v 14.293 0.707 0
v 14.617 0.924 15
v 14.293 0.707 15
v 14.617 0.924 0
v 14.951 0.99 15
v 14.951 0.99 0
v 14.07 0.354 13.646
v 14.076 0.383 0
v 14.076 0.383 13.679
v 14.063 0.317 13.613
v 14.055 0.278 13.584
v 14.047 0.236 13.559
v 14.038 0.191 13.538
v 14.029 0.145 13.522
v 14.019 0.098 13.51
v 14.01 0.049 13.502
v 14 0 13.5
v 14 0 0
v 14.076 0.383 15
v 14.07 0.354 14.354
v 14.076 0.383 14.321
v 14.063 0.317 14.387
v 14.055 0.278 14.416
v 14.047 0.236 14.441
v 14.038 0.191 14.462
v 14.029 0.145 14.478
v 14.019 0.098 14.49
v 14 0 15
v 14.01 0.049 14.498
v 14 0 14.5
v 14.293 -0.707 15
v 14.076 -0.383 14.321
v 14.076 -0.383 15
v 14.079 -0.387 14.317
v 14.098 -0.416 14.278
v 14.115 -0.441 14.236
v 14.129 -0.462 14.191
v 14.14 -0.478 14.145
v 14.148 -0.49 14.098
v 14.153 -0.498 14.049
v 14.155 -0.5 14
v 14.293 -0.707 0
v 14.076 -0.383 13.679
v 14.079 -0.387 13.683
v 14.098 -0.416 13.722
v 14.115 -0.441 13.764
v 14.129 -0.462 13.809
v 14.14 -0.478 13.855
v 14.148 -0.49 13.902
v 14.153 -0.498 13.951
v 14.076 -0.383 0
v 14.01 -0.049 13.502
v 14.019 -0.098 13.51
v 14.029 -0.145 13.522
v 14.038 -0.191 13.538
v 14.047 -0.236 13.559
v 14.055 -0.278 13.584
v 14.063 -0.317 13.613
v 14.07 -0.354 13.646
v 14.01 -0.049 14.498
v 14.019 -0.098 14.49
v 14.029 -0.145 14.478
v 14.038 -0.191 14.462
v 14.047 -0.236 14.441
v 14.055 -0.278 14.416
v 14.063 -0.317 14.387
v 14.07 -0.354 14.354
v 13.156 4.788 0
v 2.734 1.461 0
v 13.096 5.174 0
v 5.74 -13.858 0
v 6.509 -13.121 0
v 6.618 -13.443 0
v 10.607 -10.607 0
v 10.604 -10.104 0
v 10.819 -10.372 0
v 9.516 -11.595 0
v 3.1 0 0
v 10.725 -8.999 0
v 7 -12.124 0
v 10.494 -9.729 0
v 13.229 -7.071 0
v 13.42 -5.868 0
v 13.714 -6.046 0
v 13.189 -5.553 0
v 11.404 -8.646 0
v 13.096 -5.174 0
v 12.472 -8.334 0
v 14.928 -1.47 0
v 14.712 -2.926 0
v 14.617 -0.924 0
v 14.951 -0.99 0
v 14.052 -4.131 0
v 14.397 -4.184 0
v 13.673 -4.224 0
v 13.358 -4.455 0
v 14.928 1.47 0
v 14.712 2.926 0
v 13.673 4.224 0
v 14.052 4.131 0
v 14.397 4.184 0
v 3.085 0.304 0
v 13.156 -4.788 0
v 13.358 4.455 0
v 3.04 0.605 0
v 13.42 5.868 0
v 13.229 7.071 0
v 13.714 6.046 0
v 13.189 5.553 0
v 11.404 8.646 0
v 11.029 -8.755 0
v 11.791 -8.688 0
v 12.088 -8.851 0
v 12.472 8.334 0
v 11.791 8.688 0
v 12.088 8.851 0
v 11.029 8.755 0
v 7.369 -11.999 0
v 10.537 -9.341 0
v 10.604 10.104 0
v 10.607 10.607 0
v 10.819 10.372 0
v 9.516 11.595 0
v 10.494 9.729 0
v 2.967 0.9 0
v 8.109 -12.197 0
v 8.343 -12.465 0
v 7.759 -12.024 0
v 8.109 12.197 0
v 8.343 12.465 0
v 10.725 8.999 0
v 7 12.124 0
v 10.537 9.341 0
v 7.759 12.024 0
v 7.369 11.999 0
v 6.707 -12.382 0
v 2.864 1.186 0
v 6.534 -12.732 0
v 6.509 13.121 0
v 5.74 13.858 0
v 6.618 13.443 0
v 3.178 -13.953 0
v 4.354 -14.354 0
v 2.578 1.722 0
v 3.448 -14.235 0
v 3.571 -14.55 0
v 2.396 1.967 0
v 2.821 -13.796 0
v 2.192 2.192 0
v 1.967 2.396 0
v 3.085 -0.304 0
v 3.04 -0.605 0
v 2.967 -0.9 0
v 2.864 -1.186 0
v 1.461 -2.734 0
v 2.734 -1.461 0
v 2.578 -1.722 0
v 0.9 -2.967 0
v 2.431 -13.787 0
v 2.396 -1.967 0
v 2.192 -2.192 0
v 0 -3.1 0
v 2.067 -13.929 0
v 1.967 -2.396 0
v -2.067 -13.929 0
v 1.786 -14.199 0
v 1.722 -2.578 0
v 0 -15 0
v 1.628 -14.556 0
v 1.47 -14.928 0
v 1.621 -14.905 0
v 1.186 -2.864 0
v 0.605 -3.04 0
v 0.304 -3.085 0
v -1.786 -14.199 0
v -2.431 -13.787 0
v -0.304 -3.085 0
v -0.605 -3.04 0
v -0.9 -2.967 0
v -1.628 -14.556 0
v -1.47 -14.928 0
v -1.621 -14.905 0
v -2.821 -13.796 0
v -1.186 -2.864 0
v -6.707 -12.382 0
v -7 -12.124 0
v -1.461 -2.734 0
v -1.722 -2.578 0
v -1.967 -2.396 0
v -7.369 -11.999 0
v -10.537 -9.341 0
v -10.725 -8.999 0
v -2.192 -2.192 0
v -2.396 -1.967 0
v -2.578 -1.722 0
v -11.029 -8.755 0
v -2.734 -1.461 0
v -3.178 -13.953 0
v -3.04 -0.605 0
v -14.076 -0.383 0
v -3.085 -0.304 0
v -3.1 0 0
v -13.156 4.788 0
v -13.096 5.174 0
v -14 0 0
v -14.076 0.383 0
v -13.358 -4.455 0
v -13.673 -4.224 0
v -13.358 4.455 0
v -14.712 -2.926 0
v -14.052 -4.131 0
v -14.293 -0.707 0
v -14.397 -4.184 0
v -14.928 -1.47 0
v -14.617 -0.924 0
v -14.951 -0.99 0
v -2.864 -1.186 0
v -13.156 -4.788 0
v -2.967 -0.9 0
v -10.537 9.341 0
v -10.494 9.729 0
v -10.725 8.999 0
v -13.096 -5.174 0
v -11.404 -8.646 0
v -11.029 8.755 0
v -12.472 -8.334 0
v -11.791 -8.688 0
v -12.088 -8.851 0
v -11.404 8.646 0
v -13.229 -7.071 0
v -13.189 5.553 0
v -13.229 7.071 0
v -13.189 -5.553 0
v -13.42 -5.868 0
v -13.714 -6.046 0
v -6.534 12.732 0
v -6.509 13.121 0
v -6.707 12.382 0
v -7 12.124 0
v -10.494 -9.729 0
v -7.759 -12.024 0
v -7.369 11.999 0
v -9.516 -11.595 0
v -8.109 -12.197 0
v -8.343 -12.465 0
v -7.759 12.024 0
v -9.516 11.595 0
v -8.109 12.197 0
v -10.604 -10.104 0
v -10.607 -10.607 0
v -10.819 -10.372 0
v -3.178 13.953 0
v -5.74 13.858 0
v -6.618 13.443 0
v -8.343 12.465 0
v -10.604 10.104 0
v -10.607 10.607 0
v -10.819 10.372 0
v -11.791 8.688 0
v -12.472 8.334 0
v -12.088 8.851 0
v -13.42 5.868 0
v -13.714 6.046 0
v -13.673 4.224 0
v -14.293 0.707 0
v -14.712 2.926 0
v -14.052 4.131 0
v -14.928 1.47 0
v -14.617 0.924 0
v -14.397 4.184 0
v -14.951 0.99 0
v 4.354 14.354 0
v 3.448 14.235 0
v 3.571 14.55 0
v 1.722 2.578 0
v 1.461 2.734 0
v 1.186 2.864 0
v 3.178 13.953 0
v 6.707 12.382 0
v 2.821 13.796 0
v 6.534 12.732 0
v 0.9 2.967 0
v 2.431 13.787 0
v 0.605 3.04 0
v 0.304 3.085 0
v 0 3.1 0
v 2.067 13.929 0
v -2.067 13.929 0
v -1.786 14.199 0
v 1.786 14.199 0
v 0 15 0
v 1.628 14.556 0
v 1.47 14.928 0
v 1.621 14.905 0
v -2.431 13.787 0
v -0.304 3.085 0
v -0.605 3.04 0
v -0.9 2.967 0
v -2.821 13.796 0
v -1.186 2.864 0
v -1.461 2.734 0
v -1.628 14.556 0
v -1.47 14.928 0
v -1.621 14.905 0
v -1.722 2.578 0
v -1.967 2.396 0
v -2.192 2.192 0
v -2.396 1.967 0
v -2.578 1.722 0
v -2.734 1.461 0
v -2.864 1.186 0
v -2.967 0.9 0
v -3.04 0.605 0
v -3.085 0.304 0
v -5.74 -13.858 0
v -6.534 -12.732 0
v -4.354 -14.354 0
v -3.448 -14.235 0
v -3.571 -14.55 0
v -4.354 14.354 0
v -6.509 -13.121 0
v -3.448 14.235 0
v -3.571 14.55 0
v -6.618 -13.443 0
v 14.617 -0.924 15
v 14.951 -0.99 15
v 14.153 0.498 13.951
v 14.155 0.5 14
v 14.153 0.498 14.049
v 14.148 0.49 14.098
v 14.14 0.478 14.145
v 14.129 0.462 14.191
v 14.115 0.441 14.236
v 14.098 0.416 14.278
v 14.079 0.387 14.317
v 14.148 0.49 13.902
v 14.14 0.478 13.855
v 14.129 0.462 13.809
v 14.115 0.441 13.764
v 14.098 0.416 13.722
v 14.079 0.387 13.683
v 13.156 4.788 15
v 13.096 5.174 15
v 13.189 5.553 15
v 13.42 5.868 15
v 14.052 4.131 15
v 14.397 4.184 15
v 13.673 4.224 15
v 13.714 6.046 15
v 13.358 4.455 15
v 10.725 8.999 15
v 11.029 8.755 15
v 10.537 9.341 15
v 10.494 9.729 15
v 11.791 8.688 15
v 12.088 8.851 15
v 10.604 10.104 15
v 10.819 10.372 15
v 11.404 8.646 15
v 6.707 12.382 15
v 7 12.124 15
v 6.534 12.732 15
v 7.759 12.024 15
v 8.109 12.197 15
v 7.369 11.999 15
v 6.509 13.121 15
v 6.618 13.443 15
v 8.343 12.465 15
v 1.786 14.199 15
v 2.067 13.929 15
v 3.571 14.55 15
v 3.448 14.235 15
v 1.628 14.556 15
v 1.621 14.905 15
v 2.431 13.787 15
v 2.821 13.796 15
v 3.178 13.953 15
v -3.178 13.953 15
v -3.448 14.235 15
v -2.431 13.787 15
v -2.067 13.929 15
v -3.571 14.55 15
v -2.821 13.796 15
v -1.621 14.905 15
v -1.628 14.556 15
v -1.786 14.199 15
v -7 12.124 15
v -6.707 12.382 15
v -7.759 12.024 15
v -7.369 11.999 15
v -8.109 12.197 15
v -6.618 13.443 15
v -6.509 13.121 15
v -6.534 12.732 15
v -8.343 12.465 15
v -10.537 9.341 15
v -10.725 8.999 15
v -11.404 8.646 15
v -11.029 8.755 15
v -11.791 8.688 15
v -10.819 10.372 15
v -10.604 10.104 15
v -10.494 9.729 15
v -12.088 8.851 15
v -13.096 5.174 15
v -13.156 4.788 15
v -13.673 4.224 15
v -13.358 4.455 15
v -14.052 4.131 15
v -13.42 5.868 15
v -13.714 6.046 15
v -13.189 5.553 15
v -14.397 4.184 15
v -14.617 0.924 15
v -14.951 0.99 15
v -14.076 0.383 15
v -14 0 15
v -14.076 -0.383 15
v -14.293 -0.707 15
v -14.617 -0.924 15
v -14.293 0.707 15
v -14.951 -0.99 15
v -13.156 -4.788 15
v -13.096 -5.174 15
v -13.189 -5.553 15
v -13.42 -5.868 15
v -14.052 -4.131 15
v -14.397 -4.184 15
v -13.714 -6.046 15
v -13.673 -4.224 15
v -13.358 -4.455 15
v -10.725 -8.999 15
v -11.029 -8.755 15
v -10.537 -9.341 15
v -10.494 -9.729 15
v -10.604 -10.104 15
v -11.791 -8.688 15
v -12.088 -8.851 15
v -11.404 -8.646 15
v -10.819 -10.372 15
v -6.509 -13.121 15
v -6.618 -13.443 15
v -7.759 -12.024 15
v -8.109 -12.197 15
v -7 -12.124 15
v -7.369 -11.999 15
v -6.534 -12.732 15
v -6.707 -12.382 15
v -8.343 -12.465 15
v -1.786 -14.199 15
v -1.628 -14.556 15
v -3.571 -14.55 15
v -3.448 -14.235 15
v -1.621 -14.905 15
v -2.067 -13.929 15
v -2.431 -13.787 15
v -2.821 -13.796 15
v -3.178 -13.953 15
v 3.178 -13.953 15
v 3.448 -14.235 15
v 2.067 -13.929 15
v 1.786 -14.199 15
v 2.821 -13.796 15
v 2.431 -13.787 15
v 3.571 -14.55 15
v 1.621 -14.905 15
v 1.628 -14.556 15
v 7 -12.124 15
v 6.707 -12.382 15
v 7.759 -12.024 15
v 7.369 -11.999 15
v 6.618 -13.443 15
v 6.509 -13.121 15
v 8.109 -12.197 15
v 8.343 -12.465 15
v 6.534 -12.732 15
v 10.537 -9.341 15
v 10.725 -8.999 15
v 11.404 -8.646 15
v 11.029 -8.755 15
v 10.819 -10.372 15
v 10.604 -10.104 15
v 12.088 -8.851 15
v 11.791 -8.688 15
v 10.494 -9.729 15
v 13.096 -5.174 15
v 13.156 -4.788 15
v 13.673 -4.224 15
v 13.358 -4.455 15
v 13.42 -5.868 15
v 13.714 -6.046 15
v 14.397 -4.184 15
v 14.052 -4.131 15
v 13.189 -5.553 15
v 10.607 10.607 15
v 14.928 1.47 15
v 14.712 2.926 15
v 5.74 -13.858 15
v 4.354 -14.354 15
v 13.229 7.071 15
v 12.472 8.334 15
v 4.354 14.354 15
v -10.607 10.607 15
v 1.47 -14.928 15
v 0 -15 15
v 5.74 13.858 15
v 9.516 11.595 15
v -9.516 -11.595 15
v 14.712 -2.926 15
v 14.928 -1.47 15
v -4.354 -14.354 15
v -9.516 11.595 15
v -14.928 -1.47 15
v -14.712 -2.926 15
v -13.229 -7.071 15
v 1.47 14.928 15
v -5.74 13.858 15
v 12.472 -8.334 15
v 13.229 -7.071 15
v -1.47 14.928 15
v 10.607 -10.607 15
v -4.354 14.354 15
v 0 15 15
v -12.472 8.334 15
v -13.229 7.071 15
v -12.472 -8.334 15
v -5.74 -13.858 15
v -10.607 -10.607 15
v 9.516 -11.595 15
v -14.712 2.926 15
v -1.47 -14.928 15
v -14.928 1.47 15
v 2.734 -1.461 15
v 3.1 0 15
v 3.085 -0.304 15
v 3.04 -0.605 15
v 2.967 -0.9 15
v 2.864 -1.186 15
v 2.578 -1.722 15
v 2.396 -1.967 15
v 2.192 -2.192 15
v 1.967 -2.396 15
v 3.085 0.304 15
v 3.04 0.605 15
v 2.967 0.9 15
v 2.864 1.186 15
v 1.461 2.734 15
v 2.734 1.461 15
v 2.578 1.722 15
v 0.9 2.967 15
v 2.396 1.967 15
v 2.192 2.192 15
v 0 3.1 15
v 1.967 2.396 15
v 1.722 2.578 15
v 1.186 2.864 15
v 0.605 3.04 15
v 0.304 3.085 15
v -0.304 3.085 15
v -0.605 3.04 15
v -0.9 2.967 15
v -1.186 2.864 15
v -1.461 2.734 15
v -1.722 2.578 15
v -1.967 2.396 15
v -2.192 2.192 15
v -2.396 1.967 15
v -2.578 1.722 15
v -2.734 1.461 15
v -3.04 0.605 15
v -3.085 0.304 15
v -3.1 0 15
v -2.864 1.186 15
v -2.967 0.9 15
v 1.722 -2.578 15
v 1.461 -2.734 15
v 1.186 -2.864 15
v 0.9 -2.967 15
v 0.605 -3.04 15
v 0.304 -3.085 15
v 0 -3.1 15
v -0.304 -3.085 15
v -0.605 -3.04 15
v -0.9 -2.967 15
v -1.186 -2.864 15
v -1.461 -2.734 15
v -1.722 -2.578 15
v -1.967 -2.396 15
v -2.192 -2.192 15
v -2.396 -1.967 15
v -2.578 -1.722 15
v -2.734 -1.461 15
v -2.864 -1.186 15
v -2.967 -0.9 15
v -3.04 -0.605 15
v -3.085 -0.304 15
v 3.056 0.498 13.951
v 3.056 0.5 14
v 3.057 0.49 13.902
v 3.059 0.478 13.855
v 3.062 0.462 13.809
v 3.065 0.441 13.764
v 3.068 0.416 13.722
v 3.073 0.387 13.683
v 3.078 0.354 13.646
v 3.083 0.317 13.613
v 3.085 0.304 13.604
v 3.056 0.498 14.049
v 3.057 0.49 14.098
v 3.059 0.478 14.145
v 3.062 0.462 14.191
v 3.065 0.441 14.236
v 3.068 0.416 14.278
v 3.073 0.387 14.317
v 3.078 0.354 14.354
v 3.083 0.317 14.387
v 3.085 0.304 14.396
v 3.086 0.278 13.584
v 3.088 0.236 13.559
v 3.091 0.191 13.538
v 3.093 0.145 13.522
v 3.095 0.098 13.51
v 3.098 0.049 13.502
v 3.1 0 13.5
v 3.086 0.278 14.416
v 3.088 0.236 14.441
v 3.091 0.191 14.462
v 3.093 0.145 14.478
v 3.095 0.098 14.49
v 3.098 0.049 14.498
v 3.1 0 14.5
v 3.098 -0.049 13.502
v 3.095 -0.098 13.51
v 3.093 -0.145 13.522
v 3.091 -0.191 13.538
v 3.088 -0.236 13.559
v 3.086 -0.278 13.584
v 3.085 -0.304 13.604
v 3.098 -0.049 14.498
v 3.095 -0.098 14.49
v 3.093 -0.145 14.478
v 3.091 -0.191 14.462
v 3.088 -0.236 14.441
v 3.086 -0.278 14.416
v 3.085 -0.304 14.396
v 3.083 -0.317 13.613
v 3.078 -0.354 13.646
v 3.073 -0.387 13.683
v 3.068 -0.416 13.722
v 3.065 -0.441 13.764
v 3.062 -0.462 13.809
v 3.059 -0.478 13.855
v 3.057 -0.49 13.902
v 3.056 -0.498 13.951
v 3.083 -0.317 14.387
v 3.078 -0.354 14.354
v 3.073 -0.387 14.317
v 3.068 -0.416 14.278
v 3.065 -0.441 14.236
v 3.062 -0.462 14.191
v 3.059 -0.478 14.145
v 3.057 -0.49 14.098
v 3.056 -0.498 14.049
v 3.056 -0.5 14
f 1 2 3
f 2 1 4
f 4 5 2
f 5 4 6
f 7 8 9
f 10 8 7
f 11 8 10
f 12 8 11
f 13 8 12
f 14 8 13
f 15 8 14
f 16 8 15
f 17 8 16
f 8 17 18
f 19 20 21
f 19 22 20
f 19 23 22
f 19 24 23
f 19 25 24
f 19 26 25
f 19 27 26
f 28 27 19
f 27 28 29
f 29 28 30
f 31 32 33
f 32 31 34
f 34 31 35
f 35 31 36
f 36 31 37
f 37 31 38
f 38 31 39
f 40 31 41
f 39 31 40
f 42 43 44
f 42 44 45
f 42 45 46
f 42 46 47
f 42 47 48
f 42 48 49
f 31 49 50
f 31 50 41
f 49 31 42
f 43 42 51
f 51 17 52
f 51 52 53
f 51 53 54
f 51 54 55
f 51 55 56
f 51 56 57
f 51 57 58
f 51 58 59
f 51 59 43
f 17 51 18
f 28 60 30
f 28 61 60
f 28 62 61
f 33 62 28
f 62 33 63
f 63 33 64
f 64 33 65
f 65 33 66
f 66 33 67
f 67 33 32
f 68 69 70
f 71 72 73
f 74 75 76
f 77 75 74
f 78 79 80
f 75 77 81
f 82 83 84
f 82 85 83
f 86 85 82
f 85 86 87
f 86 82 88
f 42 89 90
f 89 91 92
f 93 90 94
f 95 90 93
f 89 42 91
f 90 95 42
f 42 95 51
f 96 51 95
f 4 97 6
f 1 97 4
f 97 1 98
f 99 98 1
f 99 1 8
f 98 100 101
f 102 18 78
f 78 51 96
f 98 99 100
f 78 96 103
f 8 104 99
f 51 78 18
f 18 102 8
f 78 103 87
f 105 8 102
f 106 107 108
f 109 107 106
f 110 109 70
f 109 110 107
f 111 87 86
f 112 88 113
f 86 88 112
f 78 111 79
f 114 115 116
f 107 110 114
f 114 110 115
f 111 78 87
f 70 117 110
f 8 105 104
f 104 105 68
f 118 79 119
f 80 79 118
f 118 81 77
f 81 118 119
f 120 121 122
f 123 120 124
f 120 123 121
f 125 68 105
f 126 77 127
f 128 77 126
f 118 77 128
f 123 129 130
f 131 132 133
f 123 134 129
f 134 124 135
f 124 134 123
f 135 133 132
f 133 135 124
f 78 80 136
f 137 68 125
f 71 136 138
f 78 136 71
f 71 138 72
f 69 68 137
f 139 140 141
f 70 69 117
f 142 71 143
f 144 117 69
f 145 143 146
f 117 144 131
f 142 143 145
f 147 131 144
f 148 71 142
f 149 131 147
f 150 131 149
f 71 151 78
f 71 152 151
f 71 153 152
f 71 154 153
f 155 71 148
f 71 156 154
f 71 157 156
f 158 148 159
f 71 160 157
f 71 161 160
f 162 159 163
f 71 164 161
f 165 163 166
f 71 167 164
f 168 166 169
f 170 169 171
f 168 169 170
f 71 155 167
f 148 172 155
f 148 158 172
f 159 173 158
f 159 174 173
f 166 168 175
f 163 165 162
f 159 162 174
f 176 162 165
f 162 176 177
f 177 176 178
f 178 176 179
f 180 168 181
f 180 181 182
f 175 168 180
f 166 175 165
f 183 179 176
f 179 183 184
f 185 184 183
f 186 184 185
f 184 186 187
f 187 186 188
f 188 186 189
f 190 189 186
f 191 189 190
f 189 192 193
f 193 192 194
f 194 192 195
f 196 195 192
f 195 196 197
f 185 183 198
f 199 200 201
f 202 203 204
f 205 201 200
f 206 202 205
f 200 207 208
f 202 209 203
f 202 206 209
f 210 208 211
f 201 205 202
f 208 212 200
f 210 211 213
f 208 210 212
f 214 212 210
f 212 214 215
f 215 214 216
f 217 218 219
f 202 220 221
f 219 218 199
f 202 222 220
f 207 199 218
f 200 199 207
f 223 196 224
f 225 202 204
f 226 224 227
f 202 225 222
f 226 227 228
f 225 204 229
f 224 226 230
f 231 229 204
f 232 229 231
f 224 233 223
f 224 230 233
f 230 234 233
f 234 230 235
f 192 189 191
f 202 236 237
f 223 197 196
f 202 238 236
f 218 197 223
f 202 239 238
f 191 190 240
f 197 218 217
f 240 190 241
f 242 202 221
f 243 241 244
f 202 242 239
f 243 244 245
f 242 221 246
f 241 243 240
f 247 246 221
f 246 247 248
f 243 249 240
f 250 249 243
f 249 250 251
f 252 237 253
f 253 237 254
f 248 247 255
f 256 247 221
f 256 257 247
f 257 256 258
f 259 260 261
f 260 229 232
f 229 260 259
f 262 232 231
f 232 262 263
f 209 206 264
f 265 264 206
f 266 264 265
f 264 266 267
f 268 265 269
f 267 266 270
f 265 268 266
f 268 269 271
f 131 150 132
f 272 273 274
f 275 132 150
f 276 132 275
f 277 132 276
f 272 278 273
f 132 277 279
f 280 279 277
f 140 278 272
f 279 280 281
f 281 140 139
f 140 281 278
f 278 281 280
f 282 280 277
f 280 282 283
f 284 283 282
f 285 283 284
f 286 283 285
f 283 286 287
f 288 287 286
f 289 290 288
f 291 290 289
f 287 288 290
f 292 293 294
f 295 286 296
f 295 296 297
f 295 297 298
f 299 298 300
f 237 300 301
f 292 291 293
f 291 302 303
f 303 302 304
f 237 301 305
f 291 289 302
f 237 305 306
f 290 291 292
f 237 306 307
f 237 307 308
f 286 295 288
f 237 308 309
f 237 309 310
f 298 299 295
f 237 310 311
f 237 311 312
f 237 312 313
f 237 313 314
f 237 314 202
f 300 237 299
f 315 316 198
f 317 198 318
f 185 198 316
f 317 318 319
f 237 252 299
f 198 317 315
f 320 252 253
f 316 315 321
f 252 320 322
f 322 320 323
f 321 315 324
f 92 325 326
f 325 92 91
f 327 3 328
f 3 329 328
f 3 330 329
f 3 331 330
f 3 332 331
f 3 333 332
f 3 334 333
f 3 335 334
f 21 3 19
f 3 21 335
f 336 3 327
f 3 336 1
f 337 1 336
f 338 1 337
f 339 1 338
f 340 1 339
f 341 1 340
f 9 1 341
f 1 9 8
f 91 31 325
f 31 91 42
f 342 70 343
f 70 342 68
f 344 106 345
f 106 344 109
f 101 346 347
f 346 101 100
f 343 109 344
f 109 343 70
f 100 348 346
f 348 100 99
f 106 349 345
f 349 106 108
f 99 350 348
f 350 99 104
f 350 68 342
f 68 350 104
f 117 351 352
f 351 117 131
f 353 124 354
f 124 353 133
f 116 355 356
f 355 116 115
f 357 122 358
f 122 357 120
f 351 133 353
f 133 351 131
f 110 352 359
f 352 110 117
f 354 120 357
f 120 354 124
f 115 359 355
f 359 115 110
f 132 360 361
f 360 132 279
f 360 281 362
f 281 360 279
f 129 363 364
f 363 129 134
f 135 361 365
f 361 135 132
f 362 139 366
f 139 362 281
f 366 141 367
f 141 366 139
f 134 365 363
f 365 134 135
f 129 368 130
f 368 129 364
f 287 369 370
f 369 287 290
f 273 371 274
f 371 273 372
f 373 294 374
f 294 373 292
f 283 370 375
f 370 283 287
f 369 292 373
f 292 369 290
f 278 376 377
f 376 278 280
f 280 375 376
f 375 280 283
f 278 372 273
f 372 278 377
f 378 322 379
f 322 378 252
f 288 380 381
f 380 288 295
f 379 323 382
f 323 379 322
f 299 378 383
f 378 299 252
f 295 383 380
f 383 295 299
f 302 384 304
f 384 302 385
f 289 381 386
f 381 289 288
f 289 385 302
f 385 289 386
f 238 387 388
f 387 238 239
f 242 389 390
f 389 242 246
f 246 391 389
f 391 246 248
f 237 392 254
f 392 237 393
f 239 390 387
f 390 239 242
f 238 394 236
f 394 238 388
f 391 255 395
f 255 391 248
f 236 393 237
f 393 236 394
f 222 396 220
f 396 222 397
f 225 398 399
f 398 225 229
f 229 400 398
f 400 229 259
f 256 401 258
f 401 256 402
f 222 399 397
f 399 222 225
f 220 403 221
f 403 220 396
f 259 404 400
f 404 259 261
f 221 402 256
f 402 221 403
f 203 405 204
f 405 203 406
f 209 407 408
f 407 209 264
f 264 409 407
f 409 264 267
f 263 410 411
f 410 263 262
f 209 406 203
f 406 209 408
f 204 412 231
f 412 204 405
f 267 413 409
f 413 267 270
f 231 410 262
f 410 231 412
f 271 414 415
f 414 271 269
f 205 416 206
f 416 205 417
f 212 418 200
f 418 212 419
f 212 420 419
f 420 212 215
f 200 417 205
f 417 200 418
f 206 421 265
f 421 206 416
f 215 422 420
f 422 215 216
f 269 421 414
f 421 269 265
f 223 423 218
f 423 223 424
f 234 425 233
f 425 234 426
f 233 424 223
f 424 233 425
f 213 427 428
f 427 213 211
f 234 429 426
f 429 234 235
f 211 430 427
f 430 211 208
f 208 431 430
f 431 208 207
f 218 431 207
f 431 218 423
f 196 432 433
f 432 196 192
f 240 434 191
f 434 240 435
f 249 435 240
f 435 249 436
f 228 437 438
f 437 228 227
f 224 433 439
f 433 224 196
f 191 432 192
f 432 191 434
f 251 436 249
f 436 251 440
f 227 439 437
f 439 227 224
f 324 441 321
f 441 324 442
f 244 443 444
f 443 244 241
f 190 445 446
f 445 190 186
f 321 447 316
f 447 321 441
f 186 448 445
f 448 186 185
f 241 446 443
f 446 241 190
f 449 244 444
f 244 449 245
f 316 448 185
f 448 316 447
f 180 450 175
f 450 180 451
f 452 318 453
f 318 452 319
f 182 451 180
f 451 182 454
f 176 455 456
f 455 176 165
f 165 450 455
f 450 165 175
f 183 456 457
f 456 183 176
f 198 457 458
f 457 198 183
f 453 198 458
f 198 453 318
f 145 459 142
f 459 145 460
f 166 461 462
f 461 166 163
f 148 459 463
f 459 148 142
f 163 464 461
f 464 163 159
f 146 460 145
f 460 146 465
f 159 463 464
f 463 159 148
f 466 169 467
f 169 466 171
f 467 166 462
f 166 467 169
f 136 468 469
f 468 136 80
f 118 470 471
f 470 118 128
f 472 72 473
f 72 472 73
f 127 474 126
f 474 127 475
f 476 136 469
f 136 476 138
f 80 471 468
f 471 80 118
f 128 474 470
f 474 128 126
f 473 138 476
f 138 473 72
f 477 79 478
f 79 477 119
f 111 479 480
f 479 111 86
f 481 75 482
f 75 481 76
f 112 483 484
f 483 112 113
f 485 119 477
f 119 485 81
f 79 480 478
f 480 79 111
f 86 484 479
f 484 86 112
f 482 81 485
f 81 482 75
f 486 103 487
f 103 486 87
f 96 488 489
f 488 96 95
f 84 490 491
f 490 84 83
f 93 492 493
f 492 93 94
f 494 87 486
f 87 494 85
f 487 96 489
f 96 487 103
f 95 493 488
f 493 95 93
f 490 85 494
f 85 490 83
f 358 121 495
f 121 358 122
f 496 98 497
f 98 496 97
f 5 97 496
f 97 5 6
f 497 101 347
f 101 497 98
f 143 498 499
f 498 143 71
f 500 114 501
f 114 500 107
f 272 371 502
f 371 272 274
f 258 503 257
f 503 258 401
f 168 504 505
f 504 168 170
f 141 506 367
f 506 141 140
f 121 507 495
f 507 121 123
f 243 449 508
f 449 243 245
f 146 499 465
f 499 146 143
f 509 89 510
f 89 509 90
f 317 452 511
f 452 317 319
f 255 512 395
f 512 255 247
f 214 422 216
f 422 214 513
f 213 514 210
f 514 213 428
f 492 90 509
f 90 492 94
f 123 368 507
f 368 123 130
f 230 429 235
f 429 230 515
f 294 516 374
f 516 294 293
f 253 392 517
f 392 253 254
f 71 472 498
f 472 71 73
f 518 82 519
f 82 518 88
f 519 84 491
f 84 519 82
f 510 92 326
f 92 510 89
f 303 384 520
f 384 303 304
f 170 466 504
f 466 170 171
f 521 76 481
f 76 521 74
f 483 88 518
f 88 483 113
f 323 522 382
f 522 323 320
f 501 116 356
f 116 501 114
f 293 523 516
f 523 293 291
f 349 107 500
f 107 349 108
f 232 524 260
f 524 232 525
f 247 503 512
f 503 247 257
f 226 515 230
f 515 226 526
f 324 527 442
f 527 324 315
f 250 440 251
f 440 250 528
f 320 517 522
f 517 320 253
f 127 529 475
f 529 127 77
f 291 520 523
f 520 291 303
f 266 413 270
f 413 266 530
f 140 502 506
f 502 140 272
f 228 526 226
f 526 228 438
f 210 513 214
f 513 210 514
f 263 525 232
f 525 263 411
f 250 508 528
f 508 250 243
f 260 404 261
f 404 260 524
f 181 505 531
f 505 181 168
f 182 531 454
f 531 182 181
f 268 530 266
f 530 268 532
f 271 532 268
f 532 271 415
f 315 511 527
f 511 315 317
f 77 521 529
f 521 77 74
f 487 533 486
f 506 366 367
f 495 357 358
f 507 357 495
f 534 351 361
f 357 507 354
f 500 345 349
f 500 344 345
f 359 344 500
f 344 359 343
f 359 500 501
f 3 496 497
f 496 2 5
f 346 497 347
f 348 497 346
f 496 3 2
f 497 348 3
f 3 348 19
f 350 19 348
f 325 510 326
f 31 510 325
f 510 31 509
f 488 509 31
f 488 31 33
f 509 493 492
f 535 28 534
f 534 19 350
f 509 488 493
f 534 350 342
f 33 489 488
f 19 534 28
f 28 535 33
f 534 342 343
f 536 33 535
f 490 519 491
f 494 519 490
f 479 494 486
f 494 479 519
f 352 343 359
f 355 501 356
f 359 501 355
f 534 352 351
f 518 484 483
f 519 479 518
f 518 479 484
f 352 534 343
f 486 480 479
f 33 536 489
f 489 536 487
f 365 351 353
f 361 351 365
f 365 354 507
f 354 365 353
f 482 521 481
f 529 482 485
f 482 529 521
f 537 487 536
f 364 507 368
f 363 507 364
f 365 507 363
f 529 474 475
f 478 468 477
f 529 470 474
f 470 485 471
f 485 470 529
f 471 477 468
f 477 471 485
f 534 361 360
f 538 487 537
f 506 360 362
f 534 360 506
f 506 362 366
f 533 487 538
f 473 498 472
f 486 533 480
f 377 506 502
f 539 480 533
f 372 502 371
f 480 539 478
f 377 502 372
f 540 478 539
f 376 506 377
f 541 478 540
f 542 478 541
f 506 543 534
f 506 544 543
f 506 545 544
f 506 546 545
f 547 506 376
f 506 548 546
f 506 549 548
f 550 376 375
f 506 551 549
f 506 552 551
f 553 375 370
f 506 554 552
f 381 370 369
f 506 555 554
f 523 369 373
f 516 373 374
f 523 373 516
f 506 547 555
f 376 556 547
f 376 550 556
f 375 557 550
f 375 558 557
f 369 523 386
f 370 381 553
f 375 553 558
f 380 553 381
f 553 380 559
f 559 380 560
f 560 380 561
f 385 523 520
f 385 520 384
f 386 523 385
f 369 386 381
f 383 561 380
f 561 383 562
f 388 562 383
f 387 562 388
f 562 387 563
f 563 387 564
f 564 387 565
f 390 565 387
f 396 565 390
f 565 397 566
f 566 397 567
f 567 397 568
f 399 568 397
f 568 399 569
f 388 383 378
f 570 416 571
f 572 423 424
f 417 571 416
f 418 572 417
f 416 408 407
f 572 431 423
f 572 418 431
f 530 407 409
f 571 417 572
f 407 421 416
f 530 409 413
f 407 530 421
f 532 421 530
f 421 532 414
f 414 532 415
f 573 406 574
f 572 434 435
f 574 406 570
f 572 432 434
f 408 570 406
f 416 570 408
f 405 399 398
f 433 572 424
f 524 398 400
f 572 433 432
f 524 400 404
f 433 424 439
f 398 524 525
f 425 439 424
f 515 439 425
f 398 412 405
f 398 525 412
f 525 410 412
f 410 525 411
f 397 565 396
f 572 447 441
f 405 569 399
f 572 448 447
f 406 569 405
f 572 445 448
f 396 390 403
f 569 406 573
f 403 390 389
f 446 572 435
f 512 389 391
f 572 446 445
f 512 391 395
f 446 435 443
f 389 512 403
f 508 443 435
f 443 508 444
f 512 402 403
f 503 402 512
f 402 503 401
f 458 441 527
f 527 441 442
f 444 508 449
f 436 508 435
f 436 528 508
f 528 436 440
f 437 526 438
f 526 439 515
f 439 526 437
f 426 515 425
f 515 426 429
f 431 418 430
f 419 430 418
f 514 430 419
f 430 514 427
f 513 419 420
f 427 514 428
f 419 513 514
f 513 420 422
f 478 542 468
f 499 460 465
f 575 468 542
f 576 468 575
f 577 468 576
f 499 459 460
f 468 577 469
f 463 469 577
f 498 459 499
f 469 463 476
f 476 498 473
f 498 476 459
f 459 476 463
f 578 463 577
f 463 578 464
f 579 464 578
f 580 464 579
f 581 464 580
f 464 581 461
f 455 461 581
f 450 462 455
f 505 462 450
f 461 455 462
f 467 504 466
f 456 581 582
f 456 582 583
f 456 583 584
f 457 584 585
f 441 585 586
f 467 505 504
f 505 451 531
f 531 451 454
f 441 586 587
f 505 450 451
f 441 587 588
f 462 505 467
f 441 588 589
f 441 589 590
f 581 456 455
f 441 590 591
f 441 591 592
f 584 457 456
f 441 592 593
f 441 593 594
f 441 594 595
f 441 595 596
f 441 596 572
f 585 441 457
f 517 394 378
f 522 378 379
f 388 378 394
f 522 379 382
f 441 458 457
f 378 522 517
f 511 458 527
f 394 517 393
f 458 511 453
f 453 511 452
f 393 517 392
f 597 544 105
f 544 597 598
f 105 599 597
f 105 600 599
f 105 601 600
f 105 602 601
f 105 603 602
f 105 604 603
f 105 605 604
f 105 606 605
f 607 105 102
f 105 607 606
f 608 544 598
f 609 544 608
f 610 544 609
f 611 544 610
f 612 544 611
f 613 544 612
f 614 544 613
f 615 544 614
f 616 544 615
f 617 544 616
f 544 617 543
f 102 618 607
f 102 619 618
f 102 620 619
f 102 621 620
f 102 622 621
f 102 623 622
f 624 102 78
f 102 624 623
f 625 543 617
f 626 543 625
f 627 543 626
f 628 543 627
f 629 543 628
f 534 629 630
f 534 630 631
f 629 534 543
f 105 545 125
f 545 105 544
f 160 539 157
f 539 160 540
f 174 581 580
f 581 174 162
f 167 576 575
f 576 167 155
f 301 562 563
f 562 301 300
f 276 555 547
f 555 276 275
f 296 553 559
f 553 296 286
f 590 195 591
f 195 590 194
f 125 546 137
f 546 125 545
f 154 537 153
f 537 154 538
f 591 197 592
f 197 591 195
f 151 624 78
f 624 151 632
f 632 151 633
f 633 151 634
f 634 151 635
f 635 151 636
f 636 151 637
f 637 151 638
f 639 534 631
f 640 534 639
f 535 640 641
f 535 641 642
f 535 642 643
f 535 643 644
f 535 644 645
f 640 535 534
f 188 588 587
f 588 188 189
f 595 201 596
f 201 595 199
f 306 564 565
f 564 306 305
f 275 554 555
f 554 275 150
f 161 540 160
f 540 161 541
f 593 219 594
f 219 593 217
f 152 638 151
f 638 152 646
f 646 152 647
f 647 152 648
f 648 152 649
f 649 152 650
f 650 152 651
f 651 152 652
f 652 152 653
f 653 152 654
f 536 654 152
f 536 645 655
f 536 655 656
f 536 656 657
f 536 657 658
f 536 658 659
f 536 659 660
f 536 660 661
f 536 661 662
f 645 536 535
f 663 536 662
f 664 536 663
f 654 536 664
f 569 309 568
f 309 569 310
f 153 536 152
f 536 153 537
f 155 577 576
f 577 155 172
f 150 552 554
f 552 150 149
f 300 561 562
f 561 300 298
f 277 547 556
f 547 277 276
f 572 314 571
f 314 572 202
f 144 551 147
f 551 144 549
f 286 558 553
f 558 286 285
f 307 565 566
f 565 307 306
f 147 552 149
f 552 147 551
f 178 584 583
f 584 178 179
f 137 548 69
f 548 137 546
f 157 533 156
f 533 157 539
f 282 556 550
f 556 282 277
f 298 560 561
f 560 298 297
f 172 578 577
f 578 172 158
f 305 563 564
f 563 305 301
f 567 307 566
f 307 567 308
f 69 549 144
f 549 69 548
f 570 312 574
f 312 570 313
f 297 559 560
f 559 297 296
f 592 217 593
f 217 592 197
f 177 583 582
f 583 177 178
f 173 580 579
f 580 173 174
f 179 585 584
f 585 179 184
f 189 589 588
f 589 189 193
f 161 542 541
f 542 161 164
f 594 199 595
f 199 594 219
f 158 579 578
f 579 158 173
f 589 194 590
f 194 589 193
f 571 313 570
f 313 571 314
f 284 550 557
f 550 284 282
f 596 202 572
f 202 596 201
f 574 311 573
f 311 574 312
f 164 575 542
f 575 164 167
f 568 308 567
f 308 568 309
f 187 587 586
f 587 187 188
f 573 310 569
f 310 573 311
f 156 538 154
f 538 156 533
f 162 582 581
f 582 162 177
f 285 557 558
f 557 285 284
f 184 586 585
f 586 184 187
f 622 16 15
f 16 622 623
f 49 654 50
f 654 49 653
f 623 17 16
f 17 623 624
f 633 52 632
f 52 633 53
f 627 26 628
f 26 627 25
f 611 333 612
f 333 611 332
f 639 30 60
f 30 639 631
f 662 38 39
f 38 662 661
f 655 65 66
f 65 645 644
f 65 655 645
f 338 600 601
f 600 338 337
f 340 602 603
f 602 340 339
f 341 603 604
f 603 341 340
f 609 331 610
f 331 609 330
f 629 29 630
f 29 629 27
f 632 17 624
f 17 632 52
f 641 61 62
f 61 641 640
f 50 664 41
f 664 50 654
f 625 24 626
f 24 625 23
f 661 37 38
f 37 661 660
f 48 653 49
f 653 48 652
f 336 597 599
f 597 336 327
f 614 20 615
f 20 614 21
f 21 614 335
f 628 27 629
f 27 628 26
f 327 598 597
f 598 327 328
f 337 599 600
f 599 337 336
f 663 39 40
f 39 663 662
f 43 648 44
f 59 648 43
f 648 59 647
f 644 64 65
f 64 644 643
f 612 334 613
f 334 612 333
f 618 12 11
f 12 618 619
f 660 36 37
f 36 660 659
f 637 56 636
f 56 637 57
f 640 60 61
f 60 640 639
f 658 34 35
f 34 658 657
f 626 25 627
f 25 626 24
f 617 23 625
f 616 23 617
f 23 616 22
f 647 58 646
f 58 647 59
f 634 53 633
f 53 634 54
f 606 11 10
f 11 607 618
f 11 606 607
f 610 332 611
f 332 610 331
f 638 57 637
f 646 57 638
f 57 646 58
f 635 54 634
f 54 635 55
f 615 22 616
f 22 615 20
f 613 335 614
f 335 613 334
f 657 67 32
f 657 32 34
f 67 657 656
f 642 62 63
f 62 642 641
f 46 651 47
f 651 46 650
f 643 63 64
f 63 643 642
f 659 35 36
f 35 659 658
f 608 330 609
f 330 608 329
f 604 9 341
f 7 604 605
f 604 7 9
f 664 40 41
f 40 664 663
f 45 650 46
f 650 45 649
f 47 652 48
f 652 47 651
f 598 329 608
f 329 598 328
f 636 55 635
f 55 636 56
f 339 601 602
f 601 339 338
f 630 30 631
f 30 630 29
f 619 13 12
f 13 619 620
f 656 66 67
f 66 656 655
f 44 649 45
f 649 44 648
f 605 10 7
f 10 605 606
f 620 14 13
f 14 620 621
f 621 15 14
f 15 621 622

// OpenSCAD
// Replacement knob for a hotplate stirrer - a cylindrical knob with a D-shaped blind bore
// to fit a D-shaft, an outer grip groove pattern, and a top pointer groove. NOVEL general part.
//

d      = 30;
h      = 15;
shaft_d = 6.2;
flat   = 4.7;
grooves = 18;
groove_d = 2;
pointer_w = 1.5;
pointer_d = 1;

$fn = 64;

flat_normal = [0, 1, 0];
flat_point  = [0, -1.5, 0];   // the flat of the D lies along Y at this radius

difference() {
    cylinder(h = h, d = d);
    translate([0, 0, 0])
        cylinder(h = h + 1, d = shaft_d);                        // round part of the bore
    translate([0, 0, 0])
        cylinder(h = h + 1, d = shaft_d, $fn = 16);            // flat part of the D-bore
    for (i = [0 : grooves - 1])
        rotate([0, 0, i * 360 / grooves])
            translate([d / 2, 0, 0])
                cylinder(h = h + 1, d = groove_d, $fn = 16);   // grip grooves
    translate([0, 0, h - 1])
        linear_extrude(h = 1.5)
            polygon([[-d / 2, -d / 2], [-d / 2, d / 2], [d / 2, d / 2], [d / 2, -d / 2],
                     [0, -d / 2], [0, d / 2]]);                 // top face groove (shape * 2)
    translate([0, 0, h - 1])
        rotate([0, 90, 0])
        linear_extrude(h = 1.5)
            circle(d = pointer_d);                             // tip of the pointer
}
